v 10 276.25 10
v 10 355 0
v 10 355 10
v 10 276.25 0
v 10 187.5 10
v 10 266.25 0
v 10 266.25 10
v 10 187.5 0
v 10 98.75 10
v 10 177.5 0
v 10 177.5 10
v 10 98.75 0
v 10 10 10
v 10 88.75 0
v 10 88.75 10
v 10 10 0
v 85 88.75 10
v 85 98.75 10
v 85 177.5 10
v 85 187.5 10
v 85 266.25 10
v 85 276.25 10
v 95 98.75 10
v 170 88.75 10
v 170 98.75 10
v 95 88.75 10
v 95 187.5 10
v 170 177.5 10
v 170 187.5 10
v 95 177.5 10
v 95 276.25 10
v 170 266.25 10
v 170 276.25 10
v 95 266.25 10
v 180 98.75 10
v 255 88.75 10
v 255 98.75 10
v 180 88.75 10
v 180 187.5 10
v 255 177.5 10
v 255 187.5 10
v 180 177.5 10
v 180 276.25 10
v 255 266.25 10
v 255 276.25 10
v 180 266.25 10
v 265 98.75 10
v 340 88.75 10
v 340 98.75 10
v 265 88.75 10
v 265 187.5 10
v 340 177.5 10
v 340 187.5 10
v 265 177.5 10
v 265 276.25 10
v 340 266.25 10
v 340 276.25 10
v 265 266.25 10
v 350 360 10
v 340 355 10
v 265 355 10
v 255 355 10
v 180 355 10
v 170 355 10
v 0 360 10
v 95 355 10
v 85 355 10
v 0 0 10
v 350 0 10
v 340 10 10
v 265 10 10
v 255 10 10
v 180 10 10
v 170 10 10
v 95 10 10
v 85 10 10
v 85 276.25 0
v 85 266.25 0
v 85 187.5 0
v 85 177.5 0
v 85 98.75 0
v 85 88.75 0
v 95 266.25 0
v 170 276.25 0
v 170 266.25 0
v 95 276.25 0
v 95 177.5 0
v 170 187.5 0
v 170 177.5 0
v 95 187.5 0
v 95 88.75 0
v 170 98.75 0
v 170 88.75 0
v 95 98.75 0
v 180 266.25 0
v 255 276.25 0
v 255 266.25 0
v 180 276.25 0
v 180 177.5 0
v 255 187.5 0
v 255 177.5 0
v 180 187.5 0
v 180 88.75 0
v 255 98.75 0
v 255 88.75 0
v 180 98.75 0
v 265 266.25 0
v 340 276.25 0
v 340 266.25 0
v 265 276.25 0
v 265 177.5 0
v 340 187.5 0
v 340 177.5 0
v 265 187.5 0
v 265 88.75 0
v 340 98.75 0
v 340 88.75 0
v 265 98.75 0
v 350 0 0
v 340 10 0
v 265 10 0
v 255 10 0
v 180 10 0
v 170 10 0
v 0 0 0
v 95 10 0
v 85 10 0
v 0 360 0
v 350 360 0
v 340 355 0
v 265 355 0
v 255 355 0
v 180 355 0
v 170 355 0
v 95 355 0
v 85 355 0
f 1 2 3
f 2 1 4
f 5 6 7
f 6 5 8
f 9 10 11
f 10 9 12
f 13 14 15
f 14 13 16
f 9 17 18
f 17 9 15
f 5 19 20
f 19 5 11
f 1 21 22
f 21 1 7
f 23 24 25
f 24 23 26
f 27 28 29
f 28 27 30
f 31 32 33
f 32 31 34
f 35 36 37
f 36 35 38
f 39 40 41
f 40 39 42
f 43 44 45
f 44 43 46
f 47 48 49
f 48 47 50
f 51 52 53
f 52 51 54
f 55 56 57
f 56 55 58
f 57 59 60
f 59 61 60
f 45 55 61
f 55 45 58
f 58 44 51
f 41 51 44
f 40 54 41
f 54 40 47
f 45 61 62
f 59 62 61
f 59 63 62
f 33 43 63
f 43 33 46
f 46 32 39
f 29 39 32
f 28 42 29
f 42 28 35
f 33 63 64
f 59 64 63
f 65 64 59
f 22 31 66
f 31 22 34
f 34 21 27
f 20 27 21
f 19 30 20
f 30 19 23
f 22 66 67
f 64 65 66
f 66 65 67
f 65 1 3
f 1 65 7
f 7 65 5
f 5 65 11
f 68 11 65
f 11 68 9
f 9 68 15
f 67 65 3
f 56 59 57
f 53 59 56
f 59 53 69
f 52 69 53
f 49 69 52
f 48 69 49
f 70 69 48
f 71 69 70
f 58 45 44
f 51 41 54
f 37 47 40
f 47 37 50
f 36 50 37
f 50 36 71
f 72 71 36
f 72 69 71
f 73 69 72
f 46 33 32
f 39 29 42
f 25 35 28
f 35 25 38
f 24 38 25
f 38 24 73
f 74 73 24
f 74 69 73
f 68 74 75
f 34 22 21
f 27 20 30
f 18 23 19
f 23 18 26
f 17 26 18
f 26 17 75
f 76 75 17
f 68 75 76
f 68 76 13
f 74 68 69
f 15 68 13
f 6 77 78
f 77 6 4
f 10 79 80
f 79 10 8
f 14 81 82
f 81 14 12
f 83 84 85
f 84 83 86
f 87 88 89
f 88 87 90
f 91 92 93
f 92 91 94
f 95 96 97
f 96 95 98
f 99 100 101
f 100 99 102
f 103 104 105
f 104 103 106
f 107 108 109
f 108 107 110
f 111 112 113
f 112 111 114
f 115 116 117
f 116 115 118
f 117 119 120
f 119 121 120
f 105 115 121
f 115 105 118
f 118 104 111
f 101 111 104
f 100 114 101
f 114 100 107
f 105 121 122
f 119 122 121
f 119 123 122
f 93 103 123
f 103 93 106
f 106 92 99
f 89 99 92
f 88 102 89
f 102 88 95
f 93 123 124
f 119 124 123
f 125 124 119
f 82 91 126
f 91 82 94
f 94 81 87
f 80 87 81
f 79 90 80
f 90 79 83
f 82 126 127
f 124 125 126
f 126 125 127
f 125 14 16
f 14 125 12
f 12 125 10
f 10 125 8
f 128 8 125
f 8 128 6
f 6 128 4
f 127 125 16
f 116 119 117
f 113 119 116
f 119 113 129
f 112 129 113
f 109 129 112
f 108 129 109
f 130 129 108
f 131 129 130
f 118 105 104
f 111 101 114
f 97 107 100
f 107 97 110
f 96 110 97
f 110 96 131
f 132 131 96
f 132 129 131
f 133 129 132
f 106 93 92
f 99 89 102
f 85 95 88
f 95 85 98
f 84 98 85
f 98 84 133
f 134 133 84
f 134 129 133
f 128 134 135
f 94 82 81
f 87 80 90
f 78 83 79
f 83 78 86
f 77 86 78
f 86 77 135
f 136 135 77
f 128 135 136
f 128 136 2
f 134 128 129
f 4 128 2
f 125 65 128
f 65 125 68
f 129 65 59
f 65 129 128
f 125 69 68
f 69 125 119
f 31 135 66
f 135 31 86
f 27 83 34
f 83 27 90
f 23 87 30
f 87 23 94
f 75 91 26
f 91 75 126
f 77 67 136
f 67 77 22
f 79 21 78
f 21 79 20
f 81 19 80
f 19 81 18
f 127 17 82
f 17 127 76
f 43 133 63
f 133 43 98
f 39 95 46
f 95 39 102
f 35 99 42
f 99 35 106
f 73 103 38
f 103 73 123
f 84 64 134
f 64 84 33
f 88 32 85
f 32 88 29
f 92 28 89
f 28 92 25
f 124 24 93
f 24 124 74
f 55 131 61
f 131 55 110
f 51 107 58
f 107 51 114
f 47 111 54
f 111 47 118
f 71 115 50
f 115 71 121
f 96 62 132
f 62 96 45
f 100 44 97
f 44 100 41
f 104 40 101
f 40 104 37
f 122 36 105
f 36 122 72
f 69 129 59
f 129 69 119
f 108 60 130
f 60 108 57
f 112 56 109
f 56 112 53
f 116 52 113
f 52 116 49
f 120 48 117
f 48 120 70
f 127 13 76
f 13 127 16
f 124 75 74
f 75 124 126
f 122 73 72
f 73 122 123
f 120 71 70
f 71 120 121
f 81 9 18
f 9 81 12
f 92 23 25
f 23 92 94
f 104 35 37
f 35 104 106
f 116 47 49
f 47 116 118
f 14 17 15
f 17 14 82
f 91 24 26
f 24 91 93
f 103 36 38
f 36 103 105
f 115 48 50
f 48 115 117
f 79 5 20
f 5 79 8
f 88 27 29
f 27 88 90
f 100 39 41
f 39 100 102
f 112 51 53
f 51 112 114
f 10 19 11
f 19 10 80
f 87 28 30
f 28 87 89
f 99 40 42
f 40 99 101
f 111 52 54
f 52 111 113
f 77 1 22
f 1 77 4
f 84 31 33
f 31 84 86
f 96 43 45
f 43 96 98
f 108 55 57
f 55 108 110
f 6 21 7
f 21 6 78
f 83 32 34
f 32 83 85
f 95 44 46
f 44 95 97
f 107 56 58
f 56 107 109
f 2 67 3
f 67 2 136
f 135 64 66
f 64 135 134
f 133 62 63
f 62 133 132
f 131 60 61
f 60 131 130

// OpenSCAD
// face_band.scad reused for right face (vertical band) — rotated mapping so X->Y

width = 350;
band_h = 360;
thk = 10;
full_height = 720;
h_bar_count = 9;
h_gap = (full_height - h_bar_count * thk) / (h_bar_count - 1);
v_gap_count = 4;
v_bars = v_gap_count + 1;
v_gap = (width - v_bars * thk) / v_gap_count;
$fn = 32;

module face_band(w=width, bh=band_h, t=thk) {
    union() {
        for (i = [0 : v_bars - 1]) {
            x = i * (t + v_gap);
            translate([x, 0, 0]) cube([t, bh, t]);
        }
        for (j = [0 : h_bar_count - 1]) {
            y_full = j * (t + h_gap);
            if (y_full < bh && (y_full + t) > 0) {
                intersection() {
                    translate([0, y_full, 0]) cube([w, t, t]);
                    translate([0, 0, 0]) cube([w, bh, t]);
                }
            }
        }
    }
}

face_band();
